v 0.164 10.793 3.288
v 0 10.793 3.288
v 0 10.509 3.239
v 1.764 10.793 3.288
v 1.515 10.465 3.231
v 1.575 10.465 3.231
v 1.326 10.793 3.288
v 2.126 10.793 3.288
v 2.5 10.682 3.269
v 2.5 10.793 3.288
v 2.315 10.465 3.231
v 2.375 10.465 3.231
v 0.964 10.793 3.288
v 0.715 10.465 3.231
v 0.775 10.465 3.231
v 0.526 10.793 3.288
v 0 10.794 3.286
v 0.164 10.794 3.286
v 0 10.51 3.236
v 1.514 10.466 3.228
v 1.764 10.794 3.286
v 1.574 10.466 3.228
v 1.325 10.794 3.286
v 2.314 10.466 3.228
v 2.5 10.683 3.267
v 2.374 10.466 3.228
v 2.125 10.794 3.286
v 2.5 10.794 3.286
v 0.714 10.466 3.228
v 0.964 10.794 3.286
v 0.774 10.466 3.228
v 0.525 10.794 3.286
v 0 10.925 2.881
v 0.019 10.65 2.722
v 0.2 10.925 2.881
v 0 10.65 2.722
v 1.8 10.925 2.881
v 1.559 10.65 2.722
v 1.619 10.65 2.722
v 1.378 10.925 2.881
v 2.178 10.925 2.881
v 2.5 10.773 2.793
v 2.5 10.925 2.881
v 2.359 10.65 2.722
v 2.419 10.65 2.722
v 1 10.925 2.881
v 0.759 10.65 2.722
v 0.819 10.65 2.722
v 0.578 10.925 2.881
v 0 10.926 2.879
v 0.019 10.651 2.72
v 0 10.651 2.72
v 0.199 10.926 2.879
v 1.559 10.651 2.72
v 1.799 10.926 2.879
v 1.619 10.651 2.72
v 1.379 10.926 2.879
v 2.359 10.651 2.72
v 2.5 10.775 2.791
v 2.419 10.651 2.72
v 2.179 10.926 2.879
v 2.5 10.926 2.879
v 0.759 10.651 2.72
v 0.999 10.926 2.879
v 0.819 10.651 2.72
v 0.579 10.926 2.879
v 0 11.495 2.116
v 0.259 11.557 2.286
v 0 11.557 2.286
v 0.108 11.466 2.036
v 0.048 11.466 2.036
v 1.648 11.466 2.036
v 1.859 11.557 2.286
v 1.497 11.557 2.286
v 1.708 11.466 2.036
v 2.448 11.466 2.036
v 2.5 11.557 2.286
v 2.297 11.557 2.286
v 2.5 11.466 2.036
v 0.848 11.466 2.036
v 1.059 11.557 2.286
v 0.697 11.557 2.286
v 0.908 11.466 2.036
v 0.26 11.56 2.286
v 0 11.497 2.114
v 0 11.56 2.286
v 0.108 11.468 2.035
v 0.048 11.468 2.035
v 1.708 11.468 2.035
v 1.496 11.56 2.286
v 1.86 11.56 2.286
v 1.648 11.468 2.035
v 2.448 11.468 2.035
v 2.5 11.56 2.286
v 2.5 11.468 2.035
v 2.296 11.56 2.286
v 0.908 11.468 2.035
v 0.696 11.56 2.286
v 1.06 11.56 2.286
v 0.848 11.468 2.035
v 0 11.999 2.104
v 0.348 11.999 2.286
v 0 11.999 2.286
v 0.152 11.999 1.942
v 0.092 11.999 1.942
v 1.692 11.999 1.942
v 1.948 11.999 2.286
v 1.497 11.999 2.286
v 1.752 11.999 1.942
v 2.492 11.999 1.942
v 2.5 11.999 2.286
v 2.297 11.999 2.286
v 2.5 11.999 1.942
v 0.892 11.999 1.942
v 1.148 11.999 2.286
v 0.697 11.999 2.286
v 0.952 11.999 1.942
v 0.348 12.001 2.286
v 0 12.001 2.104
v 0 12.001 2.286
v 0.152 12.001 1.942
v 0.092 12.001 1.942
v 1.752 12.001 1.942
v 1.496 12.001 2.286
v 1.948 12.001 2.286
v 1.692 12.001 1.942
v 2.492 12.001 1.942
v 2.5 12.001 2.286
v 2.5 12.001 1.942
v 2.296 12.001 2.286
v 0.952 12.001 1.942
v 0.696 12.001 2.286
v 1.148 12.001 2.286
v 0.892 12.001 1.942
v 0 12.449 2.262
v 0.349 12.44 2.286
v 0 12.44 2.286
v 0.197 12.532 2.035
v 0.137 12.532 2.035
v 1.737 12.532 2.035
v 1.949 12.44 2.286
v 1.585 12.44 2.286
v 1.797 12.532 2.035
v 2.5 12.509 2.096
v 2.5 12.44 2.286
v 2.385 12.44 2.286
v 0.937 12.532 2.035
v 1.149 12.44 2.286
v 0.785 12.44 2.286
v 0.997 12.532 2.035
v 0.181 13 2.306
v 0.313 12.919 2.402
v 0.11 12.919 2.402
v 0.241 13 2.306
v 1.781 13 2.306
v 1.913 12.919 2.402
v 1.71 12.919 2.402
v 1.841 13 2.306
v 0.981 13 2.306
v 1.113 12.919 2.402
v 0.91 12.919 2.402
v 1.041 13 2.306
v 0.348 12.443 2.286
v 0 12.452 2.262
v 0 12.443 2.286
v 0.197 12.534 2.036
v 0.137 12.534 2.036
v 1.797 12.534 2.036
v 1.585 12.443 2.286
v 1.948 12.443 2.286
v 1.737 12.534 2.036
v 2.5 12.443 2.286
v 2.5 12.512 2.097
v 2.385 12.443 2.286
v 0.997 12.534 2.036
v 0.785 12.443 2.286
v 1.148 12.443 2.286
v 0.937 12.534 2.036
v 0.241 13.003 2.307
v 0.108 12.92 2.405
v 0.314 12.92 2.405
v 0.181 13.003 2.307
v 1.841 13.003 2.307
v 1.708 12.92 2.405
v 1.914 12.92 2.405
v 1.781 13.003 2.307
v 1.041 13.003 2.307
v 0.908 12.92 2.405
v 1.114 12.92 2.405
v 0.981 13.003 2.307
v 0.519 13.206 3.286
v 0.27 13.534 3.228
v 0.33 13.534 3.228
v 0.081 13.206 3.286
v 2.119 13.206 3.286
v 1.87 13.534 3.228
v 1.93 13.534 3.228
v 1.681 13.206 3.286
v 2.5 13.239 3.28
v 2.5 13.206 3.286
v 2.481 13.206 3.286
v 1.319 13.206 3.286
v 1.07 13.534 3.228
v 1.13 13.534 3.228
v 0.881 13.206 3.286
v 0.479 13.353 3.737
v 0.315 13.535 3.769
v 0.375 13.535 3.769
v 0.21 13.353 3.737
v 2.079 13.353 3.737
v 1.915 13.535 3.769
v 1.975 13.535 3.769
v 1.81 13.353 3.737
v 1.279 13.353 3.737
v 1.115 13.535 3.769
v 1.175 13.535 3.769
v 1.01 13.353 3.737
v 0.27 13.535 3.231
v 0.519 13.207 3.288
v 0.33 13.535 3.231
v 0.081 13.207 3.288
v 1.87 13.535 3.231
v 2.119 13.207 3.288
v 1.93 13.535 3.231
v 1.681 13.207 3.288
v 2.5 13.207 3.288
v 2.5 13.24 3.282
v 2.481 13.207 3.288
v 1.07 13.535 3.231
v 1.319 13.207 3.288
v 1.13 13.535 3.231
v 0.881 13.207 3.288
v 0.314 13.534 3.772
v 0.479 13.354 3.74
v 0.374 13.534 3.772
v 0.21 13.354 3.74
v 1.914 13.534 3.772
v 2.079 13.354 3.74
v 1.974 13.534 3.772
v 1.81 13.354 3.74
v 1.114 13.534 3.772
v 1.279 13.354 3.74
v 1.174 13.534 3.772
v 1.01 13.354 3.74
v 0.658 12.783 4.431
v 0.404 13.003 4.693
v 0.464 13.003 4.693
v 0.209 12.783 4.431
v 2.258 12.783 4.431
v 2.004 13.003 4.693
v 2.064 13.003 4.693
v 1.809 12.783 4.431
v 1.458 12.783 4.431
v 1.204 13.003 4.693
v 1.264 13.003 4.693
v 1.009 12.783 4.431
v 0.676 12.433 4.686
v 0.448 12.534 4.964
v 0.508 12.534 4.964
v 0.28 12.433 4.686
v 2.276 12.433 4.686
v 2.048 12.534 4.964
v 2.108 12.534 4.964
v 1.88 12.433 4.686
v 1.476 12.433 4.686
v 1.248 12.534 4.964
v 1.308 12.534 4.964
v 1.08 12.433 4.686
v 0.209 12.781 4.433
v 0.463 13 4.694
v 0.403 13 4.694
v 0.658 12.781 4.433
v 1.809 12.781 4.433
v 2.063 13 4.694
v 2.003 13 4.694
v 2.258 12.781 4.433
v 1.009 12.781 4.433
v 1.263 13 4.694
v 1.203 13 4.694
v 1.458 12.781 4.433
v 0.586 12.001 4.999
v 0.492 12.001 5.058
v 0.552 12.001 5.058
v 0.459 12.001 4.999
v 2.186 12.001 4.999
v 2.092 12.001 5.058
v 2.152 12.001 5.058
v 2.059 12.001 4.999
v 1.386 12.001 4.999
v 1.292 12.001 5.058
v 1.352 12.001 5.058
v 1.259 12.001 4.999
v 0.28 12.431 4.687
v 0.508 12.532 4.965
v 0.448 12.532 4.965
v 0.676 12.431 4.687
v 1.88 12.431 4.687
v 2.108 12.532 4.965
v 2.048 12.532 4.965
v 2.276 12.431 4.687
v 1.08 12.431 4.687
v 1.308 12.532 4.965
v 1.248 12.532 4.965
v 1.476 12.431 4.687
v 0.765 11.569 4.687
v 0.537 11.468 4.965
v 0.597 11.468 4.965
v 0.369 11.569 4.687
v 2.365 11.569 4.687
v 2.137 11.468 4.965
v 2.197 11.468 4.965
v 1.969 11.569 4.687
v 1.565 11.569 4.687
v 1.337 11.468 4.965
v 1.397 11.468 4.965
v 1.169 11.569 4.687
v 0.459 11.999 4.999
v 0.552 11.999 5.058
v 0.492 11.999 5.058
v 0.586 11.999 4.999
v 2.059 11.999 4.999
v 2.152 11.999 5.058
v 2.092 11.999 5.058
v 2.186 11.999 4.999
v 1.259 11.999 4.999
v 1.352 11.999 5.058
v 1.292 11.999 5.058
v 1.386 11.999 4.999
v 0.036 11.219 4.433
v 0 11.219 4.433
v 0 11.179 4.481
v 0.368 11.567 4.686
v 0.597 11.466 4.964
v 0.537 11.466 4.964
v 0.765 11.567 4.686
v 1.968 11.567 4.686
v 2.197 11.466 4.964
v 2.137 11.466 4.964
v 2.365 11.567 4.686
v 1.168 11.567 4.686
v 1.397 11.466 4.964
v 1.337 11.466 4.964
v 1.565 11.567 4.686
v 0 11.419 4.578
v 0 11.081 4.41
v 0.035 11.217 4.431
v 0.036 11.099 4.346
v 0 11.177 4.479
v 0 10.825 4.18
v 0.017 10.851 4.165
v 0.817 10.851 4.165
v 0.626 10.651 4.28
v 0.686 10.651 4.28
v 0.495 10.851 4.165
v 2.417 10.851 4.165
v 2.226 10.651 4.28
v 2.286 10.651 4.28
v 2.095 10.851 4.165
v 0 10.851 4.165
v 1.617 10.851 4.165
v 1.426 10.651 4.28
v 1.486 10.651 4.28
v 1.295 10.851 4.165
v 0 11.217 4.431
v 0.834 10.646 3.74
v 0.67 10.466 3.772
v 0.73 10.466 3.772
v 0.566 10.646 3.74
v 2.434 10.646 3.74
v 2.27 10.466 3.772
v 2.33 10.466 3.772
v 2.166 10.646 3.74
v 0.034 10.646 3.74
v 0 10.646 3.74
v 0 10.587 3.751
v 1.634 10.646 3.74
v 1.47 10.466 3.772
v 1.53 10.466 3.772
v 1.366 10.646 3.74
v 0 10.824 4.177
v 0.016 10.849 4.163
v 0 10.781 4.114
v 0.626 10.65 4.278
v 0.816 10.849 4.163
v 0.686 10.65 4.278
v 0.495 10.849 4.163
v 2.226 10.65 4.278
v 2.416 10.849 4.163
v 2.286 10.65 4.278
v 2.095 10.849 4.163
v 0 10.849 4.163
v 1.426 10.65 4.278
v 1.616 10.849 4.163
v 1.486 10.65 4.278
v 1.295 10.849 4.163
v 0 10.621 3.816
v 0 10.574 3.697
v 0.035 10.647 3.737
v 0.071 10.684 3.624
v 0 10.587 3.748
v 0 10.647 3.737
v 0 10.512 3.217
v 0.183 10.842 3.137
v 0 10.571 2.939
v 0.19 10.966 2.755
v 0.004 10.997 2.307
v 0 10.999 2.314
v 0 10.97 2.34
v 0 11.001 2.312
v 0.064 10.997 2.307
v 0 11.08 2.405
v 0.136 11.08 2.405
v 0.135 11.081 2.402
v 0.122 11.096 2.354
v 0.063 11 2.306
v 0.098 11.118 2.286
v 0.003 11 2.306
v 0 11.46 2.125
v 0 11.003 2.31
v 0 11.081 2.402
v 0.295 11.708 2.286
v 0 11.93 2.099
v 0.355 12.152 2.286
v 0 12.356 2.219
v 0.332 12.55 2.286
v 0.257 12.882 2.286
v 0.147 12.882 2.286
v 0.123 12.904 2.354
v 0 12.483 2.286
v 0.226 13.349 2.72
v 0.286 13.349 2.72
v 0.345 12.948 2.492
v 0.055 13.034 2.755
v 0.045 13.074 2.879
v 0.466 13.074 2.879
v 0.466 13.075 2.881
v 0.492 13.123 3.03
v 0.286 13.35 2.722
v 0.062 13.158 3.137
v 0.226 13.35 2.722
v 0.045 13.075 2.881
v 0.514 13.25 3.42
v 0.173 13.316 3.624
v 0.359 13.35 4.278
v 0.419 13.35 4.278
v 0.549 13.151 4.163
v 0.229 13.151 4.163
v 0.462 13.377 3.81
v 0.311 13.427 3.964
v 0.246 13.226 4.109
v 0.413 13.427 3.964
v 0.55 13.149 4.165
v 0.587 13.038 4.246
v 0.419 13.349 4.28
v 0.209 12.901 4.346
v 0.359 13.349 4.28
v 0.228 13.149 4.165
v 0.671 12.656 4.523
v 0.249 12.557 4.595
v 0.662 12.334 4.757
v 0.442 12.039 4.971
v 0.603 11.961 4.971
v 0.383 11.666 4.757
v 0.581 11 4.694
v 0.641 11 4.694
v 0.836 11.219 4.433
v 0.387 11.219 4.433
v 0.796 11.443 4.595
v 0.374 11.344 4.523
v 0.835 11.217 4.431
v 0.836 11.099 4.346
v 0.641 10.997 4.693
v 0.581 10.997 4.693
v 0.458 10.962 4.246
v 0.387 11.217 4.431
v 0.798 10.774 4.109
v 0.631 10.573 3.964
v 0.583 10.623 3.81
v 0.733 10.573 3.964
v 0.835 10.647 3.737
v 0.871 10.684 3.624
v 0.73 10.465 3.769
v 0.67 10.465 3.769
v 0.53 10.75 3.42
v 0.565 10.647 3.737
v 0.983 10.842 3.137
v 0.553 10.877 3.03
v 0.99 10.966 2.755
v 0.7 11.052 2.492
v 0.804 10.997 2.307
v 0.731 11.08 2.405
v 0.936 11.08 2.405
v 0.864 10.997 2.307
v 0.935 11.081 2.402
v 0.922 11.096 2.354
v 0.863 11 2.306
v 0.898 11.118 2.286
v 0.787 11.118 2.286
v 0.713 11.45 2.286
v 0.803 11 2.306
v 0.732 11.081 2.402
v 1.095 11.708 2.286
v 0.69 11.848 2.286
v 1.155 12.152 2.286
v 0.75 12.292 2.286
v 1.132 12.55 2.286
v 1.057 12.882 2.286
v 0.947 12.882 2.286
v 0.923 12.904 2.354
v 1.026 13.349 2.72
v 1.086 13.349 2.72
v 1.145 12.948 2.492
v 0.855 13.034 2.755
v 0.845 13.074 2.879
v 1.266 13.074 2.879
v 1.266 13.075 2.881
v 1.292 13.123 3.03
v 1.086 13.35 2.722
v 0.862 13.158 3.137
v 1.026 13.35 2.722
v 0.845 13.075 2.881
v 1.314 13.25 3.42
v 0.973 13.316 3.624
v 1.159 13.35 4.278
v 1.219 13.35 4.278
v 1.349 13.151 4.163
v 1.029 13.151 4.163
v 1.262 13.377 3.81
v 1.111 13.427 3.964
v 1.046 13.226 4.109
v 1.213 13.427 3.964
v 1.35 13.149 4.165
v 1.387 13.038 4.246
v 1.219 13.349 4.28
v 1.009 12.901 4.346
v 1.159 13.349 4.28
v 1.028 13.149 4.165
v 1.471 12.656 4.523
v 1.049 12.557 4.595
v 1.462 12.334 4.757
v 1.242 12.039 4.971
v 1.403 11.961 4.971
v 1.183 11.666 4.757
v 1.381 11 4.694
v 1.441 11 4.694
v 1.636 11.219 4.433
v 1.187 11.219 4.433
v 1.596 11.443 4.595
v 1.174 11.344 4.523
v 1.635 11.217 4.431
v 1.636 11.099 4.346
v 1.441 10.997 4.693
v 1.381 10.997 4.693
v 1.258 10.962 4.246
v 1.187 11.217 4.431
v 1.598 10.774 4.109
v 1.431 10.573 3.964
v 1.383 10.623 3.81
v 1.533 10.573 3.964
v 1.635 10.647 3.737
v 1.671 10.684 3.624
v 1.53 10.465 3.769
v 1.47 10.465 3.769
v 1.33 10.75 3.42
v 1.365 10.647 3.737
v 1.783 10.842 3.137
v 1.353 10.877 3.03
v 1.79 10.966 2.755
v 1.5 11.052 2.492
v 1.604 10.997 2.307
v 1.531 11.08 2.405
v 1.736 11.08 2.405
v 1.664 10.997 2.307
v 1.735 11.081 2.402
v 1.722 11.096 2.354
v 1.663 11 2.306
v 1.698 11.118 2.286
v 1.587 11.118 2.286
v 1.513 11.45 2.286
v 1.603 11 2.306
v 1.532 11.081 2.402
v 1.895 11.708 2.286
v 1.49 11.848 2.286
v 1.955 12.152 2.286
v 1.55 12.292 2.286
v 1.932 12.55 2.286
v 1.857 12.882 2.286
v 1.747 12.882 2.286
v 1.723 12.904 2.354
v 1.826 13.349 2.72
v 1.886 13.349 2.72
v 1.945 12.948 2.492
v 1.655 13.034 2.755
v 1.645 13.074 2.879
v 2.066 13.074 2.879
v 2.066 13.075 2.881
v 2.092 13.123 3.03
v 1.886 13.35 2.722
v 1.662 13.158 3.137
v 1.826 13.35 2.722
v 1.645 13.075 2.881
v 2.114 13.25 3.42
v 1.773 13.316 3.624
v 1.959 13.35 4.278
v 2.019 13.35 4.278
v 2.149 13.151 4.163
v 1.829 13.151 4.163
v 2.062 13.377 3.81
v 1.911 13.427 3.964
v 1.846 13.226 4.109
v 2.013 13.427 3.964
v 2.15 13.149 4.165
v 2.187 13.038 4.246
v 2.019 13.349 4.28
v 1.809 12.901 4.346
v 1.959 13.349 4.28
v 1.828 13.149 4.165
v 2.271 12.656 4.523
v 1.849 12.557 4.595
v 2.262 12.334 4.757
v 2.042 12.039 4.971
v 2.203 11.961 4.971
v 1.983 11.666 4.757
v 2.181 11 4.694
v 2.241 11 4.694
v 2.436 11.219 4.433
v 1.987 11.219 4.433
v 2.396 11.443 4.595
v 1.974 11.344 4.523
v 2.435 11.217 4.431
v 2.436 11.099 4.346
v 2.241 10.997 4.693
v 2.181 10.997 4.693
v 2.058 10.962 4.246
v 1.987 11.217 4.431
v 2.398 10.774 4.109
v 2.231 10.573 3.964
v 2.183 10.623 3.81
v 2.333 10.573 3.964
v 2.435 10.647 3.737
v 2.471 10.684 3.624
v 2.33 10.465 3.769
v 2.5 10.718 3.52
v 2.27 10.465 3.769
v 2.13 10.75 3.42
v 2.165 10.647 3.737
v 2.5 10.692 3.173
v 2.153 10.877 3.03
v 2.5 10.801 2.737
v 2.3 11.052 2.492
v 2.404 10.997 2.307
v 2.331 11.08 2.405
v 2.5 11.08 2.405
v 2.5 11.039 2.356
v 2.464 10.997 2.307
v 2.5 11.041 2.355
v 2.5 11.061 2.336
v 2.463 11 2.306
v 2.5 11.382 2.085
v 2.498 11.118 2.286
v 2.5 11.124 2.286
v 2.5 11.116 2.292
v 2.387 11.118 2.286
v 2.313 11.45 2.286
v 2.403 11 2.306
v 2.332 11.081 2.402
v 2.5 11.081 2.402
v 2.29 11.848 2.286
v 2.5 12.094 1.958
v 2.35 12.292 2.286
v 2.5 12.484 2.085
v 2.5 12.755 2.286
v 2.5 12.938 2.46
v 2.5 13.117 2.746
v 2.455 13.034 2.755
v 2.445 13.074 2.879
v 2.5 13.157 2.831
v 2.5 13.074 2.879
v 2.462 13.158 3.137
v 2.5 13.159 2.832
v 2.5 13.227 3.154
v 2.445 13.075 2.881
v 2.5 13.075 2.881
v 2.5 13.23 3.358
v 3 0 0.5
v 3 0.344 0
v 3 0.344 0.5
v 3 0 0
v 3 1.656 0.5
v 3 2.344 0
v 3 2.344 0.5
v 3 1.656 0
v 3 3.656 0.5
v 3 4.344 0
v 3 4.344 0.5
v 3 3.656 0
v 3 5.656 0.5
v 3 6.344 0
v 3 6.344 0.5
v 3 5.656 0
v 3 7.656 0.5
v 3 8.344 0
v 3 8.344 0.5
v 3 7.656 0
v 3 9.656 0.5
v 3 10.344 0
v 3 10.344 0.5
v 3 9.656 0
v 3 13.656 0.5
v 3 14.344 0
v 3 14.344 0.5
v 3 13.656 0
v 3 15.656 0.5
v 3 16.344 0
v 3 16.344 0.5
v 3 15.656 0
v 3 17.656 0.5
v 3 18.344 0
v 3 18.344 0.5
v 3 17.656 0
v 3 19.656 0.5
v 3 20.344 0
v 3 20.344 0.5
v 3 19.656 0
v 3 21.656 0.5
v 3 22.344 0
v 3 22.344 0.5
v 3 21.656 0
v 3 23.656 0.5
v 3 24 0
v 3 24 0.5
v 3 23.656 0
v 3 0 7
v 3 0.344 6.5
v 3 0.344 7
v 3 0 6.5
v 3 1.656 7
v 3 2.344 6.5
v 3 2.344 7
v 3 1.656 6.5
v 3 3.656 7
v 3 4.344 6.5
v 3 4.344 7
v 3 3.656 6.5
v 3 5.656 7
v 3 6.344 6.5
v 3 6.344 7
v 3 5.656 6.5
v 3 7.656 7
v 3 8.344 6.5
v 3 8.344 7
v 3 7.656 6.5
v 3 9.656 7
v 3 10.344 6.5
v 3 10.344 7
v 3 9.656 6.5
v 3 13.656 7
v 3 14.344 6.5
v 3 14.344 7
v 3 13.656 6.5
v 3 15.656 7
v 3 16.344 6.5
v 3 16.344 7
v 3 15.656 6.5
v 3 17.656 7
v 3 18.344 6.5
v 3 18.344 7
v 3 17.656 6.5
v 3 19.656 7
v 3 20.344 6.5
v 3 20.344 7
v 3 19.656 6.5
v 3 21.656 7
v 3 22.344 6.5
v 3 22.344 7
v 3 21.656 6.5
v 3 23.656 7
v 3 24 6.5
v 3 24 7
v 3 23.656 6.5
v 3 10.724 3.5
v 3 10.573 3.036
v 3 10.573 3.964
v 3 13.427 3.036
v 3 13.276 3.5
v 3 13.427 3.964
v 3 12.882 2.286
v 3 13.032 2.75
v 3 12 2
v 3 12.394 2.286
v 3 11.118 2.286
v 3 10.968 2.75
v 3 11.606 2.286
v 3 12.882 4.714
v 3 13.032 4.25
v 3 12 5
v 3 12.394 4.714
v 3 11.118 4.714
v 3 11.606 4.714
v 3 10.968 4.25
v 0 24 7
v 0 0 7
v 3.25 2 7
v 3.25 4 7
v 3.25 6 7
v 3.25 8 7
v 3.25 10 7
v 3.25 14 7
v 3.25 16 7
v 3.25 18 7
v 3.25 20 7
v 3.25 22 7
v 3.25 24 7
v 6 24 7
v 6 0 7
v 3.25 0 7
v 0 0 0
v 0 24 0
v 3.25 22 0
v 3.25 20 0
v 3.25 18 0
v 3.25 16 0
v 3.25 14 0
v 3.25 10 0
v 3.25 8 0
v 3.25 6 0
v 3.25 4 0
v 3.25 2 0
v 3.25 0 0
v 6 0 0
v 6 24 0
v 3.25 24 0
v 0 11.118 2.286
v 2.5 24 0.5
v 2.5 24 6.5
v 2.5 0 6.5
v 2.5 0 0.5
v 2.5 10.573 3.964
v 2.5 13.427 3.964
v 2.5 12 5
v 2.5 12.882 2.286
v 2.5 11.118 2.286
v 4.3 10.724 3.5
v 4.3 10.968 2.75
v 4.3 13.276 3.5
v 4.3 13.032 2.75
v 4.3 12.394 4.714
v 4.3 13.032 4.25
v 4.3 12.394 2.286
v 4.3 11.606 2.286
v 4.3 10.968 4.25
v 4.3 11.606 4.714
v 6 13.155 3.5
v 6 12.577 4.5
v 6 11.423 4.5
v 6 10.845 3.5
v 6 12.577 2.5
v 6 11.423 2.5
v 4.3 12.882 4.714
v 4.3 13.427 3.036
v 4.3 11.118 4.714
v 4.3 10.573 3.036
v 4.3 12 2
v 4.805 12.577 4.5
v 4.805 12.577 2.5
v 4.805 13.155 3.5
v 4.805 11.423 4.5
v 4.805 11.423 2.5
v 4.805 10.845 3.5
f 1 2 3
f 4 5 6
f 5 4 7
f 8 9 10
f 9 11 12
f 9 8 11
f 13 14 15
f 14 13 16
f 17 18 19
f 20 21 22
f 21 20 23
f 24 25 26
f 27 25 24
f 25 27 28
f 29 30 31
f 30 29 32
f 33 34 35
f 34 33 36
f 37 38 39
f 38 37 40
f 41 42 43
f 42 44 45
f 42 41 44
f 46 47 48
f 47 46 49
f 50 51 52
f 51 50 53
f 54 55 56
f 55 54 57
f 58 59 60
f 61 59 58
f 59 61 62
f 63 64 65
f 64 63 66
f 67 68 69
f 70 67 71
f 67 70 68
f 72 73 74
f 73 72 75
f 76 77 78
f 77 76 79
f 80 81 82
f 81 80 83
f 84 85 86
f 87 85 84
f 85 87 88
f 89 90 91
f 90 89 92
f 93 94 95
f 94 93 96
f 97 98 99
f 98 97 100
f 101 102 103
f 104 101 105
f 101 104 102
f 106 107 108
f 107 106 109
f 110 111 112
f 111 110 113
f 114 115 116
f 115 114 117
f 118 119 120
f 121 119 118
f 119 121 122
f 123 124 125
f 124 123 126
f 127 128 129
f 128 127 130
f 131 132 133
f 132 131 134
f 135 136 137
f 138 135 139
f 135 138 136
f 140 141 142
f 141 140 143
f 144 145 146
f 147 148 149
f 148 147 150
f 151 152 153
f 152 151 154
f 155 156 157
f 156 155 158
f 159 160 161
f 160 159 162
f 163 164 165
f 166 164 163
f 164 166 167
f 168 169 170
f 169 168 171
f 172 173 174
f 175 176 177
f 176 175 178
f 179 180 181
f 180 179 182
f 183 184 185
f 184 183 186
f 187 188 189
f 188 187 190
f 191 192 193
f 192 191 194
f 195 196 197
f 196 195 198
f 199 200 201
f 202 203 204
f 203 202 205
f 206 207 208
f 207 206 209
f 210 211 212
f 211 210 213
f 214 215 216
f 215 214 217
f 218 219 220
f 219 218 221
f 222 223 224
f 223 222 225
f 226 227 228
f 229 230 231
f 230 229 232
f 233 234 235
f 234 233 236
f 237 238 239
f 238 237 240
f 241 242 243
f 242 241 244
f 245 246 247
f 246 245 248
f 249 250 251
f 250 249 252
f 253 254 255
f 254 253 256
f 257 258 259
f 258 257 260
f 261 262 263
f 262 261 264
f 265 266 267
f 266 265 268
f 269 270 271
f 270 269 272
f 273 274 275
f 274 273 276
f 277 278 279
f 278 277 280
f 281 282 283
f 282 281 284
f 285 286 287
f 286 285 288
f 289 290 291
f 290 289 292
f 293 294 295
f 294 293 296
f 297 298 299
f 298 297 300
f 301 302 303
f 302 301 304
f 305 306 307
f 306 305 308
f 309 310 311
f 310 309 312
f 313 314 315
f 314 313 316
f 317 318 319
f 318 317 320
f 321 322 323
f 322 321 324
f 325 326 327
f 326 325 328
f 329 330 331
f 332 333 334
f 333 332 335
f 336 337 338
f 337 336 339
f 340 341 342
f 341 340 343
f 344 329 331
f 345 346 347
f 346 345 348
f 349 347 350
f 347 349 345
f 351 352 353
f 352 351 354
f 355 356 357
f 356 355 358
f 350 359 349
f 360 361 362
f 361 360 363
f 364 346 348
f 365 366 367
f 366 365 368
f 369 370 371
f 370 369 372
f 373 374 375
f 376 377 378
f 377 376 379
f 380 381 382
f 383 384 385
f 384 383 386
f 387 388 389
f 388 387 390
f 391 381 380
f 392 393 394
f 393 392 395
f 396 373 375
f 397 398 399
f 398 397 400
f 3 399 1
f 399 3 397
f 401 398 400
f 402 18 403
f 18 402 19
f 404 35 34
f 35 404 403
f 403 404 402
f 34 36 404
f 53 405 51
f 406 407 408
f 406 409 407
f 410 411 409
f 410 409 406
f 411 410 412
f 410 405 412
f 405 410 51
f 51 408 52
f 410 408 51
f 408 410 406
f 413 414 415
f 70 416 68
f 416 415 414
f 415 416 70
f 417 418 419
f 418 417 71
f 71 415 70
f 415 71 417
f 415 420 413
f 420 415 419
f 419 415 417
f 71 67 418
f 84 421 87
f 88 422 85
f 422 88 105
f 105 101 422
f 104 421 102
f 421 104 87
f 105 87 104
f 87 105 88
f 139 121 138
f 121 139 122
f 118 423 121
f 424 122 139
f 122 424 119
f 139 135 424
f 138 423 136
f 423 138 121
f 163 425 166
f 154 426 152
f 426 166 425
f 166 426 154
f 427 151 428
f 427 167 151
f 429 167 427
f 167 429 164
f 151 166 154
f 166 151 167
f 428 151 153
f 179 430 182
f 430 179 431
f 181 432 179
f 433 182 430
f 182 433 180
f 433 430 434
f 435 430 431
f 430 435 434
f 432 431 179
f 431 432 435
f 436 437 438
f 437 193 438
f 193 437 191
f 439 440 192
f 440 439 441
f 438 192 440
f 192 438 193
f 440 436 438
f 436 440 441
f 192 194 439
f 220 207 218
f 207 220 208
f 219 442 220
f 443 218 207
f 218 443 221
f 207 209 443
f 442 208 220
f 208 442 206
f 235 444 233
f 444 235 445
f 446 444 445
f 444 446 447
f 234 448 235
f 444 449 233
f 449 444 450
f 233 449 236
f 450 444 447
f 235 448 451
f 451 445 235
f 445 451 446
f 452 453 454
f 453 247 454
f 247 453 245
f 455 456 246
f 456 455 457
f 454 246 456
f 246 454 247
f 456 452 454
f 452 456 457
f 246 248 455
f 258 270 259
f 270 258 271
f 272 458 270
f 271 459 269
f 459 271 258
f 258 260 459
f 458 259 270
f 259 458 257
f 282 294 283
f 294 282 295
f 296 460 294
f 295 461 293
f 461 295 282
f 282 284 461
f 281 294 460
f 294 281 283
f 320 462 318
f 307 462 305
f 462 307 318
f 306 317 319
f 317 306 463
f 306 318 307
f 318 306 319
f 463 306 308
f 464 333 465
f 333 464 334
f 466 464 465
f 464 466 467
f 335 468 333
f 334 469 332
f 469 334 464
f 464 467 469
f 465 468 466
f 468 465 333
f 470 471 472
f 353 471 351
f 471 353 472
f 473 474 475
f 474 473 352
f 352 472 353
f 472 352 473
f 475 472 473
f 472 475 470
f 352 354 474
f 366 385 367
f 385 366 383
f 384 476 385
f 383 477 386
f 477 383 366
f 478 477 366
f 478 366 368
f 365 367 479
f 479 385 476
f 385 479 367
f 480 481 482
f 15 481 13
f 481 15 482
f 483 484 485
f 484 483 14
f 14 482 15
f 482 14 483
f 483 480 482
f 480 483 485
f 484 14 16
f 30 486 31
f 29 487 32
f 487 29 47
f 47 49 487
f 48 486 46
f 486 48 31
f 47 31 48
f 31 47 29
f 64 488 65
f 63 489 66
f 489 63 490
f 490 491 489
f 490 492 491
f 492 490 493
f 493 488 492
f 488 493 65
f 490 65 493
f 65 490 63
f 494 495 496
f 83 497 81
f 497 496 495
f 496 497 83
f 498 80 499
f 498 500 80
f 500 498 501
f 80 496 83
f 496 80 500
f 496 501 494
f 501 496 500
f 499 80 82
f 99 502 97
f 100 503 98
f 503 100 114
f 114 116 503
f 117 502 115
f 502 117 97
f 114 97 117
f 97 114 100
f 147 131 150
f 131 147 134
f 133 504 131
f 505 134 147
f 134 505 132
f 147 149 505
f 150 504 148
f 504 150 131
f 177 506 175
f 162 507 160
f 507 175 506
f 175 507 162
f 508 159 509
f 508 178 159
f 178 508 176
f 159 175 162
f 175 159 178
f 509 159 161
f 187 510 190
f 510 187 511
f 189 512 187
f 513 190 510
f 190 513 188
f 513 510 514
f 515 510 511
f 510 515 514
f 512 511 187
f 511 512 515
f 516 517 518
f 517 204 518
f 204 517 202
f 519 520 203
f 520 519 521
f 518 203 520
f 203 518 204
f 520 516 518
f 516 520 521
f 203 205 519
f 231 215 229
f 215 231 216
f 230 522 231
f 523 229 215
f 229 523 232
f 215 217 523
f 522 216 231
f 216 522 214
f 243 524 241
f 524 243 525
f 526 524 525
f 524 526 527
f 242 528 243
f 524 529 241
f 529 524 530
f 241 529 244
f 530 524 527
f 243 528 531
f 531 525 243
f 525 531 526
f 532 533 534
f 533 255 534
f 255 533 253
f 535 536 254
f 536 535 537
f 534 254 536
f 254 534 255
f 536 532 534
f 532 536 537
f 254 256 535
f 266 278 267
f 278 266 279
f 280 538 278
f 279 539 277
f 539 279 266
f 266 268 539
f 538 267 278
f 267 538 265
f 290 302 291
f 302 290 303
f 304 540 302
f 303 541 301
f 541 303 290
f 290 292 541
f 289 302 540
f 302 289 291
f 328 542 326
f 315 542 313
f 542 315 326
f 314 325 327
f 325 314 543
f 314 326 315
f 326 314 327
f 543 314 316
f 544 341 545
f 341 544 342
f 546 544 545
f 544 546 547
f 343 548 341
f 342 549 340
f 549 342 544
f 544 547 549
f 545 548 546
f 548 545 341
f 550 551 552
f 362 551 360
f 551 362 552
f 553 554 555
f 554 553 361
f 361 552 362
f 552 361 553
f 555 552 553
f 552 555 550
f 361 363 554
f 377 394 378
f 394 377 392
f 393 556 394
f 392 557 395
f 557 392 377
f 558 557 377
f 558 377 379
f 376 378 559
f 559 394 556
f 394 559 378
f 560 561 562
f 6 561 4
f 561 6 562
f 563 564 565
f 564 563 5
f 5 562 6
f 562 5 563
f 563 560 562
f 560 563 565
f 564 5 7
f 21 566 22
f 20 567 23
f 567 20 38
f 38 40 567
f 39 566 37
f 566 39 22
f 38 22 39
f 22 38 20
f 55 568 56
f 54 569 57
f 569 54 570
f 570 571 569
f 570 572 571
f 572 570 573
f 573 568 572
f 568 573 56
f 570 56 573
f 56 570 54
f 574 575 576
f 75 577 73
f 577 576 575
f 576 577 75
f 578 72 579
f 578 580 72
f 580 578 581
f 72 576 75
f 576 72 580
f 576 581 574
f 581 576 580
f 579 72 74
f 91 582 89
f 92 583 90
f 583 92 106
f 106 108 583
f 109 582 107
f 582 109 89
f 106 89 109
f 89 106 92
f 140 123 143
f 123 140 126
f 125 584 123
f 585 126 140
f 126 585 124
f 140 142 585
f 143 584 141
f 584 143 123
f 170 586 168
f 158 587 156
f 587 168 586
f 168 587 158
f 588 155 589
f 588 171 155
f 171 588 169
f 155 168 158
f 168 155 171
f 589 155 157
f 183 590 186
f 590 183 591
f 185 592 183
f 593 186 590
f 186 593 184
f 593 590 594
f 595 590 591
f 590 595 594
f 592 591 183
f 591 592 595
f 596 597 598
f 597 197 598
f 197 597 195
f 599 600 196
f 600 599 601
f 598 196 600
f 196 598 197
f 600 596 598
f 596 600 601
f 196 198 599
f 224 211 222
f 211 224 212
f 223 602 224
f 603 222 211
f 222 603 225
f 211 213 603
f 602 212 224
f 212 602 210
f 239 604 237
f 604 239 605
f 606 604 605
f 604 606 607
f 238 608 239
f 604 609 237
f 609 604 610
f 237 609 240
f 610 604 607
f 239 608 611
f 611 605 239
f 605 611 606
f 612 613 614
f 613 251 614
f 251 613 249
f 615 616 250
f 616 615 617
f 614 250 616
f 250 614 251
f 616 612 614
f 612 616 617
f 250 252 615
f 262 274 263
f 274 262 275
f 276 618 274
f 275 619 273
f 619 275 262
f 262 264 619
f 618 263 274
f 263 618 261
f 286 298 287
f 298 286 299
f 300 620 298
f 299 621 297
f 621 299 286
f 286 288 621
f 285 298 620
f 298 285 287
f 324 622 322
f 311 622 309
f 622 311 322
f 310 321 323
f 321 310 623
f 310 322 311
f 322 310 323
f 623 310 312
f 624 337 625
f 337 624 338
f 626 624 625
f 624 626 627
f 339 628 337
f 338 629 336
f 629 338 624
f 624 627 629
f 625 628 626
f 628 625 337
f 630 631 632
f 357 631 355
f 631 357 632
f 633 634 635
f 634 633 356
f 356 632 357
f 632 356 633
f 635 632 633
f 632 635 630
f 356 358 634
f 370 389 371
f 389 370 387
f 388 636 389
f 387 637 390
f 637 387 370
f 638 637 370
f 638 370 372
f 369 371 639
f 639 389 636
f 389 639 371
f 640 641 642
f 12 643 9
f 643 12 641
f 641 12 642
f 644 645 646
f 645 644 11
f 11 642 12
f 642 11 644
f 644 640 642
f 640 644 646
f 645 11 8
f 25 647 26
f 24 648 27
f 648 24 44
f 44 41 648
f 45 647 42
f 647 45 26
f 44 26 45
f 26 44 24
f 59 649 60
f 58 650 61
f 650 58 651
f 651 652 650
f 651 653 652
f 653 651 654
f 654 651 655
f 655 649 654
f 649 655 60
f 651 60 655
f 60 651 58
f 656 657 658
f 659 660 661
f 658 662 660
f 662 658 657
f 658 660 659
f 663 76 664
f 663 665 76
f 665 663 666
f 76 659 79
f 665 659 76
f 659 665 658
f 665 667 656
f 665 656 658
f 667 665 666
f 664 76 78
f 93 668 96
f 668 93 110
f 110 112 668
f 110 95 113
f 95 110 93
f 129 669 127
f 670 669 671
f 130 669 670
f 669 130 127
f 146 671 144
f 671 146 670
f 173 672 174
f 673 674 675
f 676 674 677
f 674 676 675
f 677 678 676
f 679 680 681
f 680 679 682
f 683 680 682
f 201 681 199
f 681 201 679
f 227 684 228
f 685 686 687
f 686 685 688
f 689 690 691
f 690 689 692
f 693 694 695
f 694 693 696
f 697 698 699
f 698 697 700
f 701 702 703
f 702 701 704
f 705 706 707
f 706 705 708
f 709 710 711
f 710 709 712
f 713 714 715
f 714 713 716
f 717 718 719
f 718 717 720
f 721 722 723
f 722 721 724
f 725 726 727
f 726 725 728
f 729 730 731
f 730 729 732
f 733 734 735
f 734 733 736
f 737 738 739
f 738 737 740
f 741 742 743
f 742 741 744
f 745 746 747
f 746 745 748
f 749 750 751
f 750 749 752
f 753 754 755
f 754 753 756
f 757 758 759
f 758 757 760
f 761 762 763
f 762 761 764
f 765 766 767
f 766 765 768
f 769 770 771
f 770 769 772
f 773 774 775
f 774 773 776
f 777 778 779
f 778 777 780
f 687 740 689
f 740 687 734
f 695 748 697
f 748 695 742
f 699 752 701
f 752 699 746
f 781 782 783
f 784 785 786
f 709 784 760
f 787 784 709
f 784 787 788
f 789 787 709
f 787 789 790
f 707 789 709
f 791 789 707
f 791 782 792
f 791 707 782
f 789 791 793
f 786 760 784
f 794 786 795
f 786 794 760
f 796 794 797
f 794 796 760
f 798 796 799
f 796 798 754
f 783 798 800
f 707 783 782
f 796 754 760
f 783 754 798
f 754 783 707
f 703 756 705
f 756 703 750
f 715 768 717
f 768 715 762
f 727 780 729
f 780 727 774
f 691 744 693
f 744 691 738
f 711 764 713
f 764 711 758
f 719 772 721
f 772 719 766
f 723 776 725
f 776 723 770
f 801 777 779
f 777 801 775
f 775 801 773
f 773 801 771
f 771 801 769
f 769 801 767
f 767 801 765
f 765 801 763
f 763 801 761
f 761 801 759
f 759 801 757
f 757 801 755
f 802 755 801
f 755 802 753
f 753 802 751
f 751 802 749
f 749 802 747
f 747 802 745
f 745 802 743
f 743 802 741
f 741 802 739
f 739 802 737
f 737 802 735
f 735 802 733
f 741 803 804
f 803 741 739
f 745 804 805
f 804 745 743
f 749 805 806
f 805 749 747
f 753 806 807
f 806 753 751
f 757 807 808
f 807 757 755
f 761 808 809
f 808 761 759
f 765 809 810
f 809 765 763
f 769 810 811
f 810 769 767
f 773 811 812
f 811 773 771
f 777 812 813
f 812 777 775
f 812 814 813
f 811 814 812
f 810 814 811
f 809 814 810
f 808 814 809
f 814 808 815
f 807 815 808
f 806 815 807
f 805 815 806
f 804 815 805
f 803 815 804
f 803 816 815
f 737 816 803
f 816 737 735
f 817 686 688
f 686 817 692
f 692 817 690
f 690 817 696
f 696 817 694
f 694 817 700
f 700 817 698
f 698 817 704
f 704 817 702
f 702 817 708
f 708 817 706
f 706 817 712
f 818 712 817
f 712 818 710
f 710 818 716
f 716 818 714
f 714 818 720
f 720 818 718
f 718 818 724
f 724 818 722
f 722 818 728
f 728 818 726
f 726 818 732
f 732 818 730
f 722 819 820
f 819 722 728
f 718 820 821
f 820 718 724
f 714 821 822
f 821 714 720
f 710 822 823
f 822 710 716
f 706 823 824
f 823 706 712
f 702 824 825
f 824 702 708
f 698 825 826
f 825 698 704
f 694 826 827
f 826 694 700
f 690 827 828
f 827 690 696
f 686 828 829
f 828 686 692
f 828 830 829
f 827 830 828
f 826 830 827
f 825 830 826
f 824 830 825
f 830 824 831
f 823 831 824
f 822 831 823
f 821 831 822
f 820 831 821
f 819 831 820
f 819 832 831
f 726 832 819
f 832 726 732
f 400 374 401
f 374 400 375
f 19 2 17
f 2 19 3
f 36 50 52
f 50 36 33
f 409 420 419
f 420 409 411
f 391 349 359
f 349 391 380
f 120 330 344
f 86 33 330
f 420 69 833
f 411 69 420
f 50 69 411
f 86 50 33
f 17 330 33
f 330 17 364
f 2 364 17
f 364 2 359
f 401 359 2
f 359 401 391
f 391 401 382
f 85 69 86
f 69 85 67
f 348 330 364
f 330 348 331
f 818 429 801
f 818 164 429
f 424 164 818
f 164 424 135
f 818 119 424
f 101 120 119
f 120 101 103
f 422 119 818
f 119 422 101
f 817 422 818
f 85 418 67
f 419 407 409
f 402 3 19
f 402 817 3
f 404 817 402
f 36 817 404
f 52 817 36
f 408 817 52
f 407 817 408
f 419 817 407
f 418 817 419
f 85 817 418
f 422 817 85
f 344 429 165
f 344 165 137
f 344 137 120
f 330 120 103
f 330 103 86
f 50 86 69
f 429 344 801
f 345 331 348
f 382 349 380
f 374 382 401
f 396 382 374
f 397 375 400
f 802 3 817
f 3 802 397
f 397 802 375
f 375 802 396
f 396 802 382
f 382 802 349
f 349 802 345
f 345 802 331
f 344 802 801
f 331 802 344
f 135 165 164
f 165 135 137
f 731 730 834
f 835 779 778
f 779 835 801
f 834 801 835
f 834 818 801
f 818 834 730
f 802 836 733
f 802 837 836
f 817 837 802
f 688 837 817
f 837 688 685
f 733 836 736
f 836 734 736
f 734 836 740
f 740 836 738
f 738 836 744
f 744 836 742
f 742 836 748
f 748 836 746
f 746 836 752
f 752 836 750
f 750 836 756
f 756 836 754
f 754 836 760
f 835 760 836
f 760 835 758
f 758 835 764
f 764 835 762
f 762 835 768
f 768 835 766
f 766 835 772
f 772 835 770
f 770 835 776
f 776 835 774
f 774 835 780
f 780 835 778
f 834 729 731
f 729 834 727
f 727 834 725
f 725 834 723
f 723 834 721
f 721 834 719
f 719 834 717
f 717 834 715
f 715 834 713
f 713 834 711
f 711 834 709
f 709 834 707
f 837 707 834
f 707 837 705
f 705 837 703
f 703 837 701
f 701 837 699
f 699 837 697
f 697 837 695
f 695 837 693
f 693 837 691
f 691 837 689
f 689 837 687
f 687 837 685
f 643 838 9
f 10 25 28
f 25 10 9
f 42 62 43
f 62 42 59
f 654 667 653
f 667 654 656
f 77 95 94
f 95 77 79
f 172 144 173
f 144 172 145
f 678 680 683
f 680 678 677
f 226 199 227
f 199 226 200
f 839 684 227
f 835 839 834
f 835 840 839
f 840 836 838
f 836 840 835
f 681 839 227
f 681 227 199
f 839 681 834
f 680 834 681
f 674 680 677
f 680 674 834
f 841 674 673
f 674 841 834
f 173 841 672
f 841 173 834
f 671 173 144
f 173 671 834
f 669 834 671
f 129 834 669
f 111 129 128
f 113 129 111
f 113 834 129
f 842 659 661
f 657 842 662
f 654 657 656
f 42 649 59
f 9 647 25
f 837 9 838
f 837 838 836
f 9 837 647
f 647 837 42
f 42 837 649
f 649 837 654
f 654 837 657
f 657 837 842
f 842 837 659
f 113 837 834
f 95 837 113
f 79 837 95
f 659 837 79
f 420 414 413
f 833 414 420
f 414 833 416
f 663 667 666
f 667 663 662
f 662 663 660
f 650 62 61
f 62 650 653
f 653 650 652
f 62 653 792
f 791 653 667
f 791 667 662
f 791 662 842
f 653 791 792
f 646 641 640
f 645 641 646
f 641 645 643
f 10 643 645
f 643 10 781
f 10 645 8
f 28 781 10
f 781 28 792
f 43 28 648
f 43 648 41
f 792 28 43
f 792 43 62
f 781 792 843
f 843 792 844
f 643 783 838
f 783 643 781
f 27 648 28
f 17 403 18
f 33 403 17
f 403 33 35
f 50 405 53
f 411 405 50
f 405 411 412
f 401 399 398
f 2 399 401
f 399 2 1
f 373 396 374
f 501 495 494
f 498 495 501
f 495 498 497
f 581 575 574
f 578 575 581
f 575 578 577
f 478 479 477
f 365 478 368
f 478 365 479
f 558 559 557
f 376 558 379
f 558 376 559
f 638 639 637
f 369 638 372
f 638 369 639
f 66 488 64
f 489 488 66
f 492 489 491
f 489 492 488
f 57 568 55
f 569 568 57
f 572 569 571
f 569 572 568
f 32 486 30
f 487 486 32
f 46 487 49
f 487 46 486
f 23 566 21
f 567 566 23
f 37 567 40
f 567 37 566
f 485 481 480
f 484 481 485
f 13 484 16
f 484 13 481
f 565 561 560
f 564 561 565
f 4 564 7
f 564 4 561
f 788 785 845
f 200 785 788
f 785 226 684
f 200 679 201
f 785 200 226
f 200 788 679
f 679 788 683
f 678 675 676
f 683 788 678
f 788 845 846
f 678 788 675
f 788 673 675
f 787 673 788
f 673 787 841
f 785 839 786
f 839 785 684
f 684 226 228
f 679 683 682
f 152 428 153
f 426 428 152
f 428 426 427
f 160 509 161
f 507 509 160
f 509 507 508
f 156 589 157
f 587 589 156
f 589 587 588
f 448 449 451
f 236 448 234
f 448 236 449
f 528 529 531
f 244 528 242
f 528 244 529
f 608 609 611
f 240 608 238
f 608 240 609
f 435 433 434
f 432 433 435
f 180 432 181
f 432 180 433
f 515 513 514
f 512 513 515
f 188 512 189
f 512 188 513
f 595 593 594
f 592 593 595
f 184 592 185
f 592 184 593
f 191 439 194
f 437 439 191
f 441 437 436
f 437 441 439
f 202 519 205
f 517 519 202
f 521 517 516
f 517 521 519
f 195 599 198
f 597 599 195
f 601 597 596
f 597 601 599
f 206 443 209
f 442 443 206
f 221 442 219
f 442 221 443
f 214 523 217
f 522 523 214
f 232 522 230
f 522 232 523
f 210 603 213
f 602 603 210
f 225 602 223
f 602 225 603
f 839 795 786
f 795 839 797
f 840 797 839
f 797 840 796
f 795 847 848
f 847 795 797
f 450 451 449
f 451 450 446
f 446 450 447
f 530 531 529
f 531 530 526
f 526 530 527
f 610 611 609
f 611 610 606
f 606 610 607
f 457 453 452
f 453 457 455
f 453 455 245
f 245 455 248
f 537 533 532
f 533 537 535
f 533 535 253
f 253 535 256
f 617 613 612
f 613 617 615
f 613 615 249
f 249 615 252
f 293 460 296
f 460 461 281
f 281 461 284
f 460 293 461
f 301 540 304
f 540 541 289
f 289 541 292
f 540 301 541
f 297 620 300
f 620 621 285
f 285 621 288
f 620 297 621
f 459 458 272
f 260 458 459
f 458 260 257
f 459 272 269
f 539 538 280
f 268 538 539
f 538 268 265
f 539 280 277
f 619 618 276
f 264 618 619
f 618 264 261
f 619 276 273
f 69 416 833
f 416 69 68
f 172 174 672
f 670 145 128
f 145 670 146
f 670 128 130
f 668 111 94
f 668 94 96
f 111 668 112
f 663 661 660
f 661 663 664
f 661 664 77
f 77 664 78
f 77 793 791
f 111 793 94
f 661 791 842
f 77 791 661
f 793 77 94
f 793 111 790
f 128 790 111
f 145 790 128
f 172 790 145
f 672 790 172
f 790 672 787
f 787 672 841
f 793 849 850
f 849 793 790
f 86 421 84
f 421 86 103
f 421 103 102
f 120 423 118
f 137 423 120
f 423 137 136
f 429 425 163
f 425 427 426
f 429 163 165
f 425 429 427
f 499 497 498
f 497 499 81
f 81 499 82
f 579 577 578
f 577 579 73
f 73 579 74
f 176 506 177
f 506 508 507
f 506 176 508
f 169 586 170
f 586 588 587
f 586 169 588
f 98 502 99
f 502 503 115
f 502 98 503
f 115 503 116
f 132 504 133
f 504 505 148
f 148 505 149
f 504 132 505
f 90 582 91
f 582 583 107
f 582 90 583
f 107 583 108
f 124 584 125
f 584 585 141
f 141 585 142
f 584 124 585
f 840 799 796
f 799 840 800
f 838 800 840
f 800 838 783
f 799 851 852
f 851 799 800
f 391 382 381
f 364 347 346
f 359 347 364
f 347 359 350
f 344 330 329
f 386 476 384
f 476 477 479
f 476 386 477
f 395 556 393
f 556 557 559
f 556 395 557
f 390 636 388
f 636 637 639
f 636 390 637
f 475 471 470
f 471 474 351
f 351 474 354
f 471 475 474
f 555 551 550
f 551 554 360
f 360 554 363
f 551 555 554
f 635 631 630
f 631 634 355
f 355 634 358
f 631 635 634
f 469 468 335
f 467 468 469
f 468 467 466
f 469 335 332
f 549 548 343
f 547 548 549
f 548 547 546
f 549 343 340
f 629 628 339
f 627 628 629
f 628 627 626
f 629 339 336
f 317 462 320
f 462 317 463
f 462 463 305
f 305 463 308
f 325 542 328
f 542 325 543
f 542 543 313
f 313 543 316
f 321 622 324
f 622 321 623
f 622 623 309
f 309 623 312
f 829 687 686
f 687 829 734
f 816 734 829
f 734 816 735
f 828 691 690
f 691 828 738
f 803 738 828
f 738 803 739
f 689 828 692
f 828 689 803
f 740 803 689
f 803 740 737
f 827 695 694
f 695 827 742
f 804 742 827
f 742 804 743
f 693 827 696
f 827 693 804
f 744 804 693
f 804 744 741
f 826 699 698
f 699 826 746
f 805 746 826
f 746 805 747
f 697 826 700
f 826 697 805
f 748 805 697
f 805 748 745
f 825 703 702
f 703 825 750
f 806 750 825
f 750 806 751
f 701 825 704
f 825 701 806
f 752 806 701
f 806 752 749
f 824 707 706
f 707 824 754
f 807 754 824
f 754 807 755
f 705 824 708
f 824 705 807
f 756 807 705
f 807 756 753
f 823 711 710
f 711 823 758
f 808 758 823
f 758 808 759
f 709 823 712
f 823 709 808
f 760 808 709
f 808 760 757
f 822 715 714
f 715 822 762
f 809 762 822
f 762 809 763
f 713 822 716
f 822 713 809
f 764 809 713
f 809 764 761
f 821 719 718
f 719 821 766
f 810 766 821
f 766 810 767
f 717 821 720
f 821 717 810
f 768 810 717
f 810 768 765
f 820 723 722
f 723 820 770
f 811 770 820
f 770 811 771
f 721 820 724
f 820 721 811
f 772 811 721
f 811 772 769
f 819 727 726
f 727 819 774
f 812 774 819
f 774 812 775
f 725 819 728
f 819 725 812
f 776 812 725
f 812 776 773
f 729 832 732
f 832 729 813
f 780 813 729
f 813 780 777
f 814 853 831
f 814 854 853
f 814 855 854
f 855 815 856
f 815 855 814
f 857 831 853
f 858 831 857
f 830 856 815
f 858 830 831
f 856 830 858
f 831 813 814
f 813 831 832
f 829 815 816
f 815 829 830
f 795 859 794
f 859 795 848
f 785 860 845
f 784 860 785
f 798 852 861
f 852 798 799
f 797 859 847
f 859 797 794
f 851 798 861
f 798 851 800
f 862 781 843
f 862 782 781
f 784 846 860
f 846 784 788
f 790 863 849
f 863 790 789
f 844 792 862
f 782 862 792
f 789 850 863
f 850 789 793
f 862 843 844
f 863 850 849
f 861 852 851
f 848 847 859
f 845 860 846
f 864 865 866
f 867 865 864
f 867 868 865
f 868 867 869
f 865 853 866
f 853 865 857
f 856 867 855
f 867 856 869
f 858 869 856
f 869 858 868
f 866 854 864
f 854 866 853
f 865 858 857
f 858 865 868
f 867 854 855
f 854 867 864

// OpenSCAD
use <threads.scad>
use <bolts/BOLTS.scad>

module belt_connector_a() {
	difference() {
		cube([3,24,7]);
		translate([2.5,-0.5,0.5]) cube([1,25,6]);
		translate([-0.5,24/2,7/2]) rotate([0,90,0]) metric_thread(3, 0.8, 4, internal=true);
	}
}

module belt_connector_b() {
	difference() {
		cube([3,24,7]);
		translate([-0.5,24/2,7/2]) rotate([0,90,0]) cylinder(r=1.5, h=4);
		translate([3.001,24/2,7/2]) rotate([0,-90,0]) MetricHexSocketCountersunkHeadScrew(key="M3", l=6, part_mode="default");
		for ( y = [0 : 2 : 24] ) {
			if (y!=12) translate([-1+0.75,y,-0.5]) cylinder(r=0.5, h=8);
		}
	}
}

belt_connector_a();
translate([3,0,0]) belt_connector_b();
translate([6,24/2,7/2]) rotate([0,-90,0]) MetricHexSocketCountersunkHeadScrew(key="M3", l=6, part_mode="default");
